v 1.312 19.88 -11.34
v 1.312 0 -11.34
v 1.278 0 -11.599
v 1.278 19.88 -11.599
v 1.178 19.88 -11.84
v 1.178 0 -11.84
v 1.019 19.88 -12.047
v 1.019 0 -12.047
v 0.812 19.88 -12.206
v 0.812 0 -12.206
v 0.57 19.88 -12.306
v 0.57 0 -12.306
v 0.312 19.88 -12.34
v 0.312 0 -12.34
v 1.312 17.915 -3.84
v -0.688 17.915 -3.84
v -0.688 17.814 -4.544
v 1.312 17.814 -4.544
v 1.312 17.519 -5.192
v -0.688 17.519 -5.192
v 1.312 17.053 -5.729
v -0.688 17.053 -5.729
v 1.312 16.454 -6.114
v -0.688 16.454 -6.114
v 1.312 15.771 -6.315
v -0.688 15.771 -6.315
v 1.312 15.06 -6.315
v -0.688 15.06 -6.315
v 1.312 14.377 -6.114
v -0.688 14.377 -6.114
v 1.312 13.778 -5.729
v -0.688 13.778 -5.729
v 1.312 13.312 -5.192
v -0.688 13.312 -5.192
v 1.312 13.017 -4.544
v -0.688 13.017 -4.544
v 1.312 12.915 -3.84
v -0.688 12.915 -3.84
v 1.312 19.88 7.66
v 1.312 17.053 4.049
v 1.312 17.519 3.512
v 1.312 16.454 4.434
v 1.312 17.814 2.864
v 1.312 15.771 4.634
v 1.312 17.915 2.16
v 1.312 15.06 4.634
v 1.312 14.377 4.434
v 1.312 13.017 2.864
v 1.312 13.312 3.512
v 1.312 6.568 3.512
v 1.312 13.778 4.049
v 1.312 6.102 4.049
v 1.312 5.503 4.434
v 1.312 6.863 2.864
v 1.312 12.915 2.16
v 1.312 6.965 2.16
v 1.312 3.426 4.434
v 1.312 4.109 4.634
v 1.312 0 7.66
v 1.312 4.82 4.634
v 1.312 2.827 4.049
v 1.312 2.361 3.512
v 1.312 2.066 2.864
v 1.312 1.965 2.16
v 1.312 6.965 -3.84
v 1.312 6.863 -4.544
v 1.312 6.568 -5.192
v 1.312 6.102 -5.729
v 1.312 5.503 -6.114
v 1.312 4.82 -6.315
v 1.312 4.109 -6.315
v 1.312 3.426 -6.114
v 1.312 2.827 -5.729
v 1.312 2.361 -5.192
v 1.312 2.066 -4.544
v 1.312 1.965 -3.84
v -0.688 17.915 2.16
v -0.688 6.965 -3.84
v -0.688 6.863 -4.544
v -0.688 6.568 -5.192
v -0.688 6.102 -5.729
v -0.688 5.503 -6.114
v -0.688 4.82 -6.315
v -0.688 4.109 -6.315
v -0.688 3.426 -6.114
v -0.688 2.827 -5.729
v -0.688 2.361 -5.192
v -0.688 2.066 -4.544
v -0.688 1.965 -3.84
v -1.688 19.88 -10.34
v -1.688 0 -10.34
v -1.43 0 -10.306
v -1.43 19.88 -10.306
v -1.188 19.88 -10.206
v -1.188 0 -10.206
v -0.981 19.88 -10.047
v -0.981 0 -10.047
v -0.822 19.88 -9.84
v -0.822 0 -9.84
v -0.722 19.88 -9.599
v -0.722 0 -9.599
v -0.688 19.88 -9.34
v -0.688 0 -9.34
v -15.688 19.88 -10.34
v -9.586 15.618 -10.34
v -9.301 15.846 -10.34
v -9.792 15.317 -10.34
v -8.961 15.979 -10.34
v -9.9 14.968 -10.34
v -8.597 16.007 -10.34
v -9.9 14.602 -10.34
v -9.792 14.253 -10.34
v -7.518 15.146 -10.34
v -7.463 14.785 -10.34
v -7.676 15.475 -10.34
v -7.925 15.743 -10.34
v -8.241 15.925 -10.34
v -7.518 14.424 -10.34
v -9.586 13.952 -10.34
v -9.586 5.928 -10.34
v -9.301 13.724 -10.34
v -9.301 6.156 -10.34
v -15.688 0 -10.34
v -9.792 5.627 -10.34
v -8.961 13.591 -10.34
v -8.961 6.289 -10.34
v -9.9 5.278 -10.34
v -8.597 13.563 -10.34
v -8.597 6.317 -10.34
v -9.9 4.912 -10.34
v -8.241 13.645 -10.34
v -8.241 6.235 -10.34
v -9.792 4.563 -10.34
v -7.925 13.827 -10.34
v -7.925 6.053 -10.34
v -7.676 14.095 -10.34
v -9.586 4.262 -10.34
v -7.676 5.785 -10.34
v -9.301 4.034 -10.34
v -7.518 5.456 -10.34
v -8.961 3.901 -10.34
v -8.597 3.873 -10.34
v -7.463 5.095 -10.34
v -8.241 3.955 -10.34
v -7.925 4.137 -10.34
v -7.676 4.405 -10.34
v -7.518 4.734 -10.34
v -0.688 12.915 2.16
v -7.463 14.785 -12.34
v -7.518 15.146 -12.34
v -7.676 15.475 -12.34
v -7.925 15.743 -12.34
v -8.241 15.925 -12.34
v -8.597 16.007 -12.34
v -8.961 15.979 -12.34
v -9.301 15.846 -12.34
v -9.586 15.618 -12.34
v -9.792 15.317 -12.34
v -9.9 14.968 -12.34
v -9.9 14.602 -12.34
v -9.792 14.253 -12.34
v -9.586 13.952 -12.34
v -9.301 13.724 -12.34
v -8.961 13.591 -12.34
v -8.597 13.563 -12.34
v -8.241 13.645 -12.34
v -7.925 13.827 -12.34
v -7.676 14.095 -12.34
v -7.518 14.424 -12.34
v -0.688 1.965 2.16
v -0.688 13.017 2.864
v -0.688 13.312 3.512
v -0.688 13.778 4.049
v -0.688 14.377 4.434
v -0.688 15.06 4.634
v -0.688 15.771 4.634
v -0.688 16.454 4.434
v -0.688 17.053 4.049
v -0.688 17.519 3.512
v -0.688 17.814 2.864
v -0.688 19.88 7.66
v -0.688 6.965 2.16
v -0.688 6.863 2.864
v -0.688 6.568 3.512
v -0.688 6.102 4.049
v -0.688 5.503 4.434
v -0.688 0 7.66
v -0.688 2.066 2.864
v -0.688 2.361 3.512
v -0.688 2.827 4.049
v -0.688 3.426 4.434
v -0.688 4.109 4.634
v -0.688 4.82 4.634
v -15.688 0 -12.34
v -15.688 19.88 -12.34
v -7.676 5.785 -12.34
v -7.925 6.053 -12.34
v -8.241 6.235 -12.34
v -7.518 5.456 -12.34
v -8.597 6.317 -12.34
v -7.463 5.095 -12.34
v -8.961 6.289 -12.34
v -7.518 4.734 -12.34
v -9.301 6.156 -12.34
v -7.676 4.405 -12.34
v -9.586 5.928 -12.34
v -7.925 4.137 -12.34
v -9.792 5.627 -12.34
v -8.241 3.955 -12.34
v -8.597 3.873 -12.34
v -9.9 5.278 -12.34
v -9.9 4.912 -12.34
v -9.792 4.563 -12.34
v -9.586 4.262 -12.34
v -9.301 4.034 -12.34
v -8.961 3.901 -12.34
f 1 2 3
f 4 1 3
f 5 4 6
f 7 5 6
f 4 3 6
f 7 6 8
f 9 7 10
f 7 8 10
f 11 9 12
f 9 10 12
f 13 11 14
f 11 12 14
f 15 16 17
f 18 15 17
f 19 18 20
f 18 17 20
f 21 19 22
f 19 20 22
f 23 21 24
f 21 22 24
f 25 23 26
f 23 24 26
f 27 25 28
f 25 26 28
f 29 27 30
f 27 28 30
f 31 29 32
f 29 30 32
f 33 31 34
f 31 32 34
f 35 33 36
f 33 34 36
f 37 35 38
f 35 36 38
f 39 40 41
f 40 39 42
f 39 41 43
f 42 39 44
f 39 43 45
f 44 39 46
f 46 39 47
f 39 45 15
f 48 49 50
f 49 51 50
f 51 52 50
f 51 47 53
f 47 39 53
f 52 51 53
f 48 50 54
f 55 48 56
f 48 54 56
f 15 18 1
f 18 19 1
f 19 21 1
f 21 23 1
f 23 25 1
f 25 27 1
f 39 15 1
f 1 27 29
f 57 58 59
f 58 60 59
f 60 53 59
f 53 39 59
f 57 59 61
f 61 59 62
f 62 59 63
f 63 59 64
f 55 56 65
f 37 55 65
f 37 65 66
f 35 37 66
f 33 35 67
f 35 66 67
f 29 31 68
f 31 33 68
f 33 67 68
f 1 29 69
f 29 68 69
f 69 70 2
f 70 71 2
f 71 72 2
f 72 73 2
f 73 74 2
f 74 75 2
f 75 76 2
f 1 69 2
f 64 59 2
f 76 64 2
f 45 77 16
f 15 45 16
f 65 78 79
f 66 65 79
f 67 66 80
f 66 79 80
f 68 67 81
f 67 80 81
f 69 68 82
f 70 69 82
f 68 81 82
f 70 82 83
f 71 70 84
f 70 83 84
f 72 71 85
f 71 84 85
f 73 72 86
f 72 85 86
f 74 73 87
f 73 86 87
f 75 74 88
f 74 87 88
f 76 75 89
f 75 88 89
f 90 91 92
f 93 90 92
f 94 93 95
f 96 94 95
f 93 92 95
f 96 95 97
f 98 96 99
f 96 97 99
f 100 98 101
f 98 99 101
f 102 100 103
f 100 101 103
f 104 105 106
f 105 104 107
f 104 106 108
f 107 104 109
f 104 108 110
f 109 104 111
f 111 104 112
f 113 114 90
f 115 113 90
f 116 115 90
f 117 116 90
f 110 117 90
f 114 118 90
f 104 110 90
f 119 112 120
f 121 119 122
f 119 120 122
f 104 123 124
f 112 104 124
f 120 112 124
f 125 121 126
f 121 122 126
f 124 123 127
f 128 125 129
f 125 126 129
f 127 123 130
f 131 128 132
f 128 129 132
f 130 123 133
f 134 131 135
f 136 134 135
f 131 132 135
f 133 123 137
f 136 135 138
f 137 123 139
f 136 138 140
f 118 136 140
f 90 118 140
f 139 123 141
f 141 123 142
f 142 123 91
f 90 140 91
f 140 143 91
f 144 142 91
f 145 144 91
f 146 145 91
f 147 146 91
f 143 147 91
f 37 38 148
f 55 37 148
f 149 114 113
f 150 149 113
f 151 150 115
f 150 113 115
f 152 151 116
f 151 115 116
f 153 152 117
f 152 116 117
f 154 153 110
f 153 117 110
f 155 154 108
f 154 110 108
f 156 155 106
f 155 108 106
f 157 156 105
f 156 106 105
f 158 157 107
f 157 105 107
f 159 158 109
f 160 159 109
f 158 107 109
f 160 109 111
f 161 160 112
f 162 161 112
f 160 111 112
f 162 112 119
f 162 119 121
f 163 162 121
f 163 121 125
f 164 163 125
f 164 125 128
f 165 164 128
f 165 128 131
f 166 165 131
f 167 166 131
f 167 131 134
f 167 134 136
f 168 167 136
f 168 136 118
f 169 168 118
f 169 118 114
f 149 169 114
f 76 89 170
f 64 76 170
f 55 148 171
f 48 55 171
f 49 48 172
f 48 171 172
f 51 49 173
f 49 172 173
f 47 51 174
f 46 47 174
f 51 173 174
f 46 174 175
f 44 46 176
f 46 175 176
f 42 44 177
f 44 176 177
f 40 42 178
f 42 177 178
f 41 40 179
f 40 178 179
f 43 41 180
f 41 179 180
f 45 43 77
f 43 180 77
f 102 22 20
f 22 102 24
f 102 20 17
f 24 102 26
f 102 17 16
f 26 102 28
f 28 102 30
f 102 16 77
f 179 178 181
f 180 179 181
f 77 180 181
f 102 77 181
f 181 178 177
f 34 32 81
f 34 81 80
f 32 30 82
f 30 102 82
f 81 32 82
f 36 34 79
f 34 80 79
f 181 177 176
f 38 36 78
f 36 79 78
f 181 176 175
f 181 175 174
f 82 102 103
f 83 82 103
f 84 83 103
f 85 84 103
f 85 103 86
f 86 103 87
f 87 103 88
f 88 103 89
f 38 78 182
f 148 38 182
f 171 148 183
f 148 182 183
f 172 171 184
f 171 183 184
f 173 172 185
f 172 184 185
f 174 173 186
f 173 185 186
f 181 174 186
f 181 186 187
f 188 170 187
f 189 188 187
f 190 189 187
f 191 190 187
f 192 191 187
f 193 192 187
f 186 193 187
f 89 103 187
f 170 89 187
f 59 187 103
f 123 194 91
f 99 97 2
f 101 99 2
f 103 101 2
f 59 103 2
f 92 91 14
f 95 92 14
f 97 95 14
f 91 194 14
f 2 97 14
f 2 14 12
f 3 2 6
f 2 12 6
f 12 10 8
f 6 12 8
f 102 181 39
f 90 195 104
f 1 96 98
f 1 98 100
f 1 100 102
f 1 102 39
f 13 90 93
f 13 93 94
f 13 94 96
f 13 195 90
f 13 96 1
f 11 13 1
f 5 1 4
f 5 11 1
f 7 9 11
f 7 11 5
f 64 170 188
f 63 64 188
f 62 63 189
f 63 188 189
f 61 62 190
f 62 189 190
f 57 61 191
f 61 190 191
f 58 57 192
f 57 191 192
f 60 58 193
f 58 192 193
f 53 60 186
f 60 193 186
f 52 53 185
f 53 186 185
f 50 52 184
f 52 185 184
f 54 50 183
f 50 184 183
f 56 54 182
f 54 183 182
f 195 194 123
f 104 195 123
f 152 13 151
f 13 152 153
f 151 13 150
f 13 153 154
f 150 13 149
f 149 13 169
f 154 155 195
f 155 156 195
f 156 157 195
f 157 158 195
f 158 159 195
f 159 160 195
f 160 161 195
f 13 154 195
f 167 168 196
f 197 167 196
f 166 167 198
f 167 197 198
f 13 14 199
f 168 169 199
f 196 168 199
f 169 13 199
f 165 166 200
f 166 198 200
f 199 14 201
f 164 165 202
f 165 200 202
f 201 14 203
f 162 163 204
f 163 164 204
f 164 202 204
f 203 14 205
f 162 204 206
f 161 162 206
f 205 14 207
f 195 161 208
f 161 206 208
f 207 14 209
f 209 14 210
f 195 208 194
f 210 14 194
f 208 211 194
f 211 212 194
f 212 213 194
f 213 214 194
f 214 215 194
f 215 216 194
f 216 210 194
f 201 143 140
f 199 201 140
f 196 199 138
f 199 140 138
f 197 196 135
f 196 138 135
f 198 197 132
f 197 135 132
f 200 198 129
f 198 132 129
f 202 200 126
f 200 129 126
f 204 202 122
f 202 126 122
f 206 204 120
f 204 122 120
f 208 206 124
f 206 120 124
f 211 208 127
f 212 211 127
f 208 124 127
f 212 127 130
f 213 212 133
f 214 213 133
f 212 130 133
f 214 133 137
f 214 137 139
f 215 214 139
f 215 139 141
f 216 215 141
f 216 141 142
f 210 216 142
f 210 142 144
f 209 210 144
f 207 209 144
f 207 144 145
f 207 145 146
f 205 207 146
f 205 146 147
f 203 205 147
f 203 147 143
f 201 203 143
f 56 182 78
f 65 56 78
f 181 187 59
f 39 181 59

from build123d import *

# Parameters (mm, degrees)
BOSS_EXTRUDE1_DEPTH = 19.88
SKETCH3_R           = 1.225
CUT_EXTRUDE1_DEPTH  = 3
CUT_EXTRUDE3_DEPTH  = 3


with BuildPart() as part:
    # Sketch1 → Boss-Extrude1 (new body)
    with BuildSketch(Plane(origin=(0, 0, 0), x_dir=(1, 0, 0), z_dir=(0, 1, 0))):
        with BuildLine():
            Line((-0.688375332, 9.340054497), (-0.688375332, -7.659945503))
            Line((-0.688375332, -7.659945503), (1.311624668, -7.659945503))
            Line((1.311624668, -7.659945503), (1.311624668, 11.340054497))
            ThreePointArc((1.311624668, 11.340054497), (1.018731449, 12.047161278), (0.311624668, 12.340054497))
            Line((0.311624668, 12.340054497), (-15.688375332, 12.340054497))
            Line((-15.688375332, 12.340054497), (-15.688375332, 10.340054497))
            Line((-15.688375332, 10.340054497), (-1.688375332, 10.340054497))
            ThreePointArc((-1.688375332, 10.340054497), (-0.981268551, 10.047161278), (-0.688375332, 9.340054497))
        make_face()
    extrude(amount=BOSS_EXTRUDE1_DEPTH)

    # Sketch3 → Cut-Extrude1 (cut, through all)
    with BuildSketch(Plane.XY.offset(-10.340054497)):
        with Locations((-8.688375332, 5.095)):
            Circle(SKETCH3_R)
        with Locations((-8.688375332, 14.785)):
            Circle(SKETCH3_R)
    extrude(amount=-CUT_EXTRUDE1_DEPTH, mode=Mode.SUBTRACT)

    # Sketch4 → Cut-Extrude3 (cut, through all)
    with BuildSketch(Plane.ZY.offset(0.688375332)):
        with BuildLine():
            Line((2.159945503, 17.915386938), (-3.840054497, 17.915386938))
            ThreePointArc((-3.840054497, 17.915386938), (-6.340054497, 15.415386938), (-3.840054497, 12.915386938))
            Line((-3.840054497, 12.915386938), (2.159945503, 12.915386938))
            ThreePointArc((2.159945503, 12.915386938), (4.659945503, 15.415386938), (2.159945503, 17.915386938))
        make_face()
        with BuildLine():
            Line((2.159945503, 6.964613062), (-3.840054497, 6.964613062))
            ThreePointArc((-3.840054497, 6.964613062), (-6.340054497, 4.464613062), (-3.840054497, 1.964613062))
            Line((-3.840054497, 1.964613062), (2.159945503, 1.964613062))
            ThreePointArc((2.159945503, 1.964613062), (4.659945503, 4.464613062), (2.159945503, 6.964613062))
        make_face()
    extrude(amount=-CUT_EXTRUDE3_DEPTH, mode=Mode.SUBTRACT)


solid = part.part
